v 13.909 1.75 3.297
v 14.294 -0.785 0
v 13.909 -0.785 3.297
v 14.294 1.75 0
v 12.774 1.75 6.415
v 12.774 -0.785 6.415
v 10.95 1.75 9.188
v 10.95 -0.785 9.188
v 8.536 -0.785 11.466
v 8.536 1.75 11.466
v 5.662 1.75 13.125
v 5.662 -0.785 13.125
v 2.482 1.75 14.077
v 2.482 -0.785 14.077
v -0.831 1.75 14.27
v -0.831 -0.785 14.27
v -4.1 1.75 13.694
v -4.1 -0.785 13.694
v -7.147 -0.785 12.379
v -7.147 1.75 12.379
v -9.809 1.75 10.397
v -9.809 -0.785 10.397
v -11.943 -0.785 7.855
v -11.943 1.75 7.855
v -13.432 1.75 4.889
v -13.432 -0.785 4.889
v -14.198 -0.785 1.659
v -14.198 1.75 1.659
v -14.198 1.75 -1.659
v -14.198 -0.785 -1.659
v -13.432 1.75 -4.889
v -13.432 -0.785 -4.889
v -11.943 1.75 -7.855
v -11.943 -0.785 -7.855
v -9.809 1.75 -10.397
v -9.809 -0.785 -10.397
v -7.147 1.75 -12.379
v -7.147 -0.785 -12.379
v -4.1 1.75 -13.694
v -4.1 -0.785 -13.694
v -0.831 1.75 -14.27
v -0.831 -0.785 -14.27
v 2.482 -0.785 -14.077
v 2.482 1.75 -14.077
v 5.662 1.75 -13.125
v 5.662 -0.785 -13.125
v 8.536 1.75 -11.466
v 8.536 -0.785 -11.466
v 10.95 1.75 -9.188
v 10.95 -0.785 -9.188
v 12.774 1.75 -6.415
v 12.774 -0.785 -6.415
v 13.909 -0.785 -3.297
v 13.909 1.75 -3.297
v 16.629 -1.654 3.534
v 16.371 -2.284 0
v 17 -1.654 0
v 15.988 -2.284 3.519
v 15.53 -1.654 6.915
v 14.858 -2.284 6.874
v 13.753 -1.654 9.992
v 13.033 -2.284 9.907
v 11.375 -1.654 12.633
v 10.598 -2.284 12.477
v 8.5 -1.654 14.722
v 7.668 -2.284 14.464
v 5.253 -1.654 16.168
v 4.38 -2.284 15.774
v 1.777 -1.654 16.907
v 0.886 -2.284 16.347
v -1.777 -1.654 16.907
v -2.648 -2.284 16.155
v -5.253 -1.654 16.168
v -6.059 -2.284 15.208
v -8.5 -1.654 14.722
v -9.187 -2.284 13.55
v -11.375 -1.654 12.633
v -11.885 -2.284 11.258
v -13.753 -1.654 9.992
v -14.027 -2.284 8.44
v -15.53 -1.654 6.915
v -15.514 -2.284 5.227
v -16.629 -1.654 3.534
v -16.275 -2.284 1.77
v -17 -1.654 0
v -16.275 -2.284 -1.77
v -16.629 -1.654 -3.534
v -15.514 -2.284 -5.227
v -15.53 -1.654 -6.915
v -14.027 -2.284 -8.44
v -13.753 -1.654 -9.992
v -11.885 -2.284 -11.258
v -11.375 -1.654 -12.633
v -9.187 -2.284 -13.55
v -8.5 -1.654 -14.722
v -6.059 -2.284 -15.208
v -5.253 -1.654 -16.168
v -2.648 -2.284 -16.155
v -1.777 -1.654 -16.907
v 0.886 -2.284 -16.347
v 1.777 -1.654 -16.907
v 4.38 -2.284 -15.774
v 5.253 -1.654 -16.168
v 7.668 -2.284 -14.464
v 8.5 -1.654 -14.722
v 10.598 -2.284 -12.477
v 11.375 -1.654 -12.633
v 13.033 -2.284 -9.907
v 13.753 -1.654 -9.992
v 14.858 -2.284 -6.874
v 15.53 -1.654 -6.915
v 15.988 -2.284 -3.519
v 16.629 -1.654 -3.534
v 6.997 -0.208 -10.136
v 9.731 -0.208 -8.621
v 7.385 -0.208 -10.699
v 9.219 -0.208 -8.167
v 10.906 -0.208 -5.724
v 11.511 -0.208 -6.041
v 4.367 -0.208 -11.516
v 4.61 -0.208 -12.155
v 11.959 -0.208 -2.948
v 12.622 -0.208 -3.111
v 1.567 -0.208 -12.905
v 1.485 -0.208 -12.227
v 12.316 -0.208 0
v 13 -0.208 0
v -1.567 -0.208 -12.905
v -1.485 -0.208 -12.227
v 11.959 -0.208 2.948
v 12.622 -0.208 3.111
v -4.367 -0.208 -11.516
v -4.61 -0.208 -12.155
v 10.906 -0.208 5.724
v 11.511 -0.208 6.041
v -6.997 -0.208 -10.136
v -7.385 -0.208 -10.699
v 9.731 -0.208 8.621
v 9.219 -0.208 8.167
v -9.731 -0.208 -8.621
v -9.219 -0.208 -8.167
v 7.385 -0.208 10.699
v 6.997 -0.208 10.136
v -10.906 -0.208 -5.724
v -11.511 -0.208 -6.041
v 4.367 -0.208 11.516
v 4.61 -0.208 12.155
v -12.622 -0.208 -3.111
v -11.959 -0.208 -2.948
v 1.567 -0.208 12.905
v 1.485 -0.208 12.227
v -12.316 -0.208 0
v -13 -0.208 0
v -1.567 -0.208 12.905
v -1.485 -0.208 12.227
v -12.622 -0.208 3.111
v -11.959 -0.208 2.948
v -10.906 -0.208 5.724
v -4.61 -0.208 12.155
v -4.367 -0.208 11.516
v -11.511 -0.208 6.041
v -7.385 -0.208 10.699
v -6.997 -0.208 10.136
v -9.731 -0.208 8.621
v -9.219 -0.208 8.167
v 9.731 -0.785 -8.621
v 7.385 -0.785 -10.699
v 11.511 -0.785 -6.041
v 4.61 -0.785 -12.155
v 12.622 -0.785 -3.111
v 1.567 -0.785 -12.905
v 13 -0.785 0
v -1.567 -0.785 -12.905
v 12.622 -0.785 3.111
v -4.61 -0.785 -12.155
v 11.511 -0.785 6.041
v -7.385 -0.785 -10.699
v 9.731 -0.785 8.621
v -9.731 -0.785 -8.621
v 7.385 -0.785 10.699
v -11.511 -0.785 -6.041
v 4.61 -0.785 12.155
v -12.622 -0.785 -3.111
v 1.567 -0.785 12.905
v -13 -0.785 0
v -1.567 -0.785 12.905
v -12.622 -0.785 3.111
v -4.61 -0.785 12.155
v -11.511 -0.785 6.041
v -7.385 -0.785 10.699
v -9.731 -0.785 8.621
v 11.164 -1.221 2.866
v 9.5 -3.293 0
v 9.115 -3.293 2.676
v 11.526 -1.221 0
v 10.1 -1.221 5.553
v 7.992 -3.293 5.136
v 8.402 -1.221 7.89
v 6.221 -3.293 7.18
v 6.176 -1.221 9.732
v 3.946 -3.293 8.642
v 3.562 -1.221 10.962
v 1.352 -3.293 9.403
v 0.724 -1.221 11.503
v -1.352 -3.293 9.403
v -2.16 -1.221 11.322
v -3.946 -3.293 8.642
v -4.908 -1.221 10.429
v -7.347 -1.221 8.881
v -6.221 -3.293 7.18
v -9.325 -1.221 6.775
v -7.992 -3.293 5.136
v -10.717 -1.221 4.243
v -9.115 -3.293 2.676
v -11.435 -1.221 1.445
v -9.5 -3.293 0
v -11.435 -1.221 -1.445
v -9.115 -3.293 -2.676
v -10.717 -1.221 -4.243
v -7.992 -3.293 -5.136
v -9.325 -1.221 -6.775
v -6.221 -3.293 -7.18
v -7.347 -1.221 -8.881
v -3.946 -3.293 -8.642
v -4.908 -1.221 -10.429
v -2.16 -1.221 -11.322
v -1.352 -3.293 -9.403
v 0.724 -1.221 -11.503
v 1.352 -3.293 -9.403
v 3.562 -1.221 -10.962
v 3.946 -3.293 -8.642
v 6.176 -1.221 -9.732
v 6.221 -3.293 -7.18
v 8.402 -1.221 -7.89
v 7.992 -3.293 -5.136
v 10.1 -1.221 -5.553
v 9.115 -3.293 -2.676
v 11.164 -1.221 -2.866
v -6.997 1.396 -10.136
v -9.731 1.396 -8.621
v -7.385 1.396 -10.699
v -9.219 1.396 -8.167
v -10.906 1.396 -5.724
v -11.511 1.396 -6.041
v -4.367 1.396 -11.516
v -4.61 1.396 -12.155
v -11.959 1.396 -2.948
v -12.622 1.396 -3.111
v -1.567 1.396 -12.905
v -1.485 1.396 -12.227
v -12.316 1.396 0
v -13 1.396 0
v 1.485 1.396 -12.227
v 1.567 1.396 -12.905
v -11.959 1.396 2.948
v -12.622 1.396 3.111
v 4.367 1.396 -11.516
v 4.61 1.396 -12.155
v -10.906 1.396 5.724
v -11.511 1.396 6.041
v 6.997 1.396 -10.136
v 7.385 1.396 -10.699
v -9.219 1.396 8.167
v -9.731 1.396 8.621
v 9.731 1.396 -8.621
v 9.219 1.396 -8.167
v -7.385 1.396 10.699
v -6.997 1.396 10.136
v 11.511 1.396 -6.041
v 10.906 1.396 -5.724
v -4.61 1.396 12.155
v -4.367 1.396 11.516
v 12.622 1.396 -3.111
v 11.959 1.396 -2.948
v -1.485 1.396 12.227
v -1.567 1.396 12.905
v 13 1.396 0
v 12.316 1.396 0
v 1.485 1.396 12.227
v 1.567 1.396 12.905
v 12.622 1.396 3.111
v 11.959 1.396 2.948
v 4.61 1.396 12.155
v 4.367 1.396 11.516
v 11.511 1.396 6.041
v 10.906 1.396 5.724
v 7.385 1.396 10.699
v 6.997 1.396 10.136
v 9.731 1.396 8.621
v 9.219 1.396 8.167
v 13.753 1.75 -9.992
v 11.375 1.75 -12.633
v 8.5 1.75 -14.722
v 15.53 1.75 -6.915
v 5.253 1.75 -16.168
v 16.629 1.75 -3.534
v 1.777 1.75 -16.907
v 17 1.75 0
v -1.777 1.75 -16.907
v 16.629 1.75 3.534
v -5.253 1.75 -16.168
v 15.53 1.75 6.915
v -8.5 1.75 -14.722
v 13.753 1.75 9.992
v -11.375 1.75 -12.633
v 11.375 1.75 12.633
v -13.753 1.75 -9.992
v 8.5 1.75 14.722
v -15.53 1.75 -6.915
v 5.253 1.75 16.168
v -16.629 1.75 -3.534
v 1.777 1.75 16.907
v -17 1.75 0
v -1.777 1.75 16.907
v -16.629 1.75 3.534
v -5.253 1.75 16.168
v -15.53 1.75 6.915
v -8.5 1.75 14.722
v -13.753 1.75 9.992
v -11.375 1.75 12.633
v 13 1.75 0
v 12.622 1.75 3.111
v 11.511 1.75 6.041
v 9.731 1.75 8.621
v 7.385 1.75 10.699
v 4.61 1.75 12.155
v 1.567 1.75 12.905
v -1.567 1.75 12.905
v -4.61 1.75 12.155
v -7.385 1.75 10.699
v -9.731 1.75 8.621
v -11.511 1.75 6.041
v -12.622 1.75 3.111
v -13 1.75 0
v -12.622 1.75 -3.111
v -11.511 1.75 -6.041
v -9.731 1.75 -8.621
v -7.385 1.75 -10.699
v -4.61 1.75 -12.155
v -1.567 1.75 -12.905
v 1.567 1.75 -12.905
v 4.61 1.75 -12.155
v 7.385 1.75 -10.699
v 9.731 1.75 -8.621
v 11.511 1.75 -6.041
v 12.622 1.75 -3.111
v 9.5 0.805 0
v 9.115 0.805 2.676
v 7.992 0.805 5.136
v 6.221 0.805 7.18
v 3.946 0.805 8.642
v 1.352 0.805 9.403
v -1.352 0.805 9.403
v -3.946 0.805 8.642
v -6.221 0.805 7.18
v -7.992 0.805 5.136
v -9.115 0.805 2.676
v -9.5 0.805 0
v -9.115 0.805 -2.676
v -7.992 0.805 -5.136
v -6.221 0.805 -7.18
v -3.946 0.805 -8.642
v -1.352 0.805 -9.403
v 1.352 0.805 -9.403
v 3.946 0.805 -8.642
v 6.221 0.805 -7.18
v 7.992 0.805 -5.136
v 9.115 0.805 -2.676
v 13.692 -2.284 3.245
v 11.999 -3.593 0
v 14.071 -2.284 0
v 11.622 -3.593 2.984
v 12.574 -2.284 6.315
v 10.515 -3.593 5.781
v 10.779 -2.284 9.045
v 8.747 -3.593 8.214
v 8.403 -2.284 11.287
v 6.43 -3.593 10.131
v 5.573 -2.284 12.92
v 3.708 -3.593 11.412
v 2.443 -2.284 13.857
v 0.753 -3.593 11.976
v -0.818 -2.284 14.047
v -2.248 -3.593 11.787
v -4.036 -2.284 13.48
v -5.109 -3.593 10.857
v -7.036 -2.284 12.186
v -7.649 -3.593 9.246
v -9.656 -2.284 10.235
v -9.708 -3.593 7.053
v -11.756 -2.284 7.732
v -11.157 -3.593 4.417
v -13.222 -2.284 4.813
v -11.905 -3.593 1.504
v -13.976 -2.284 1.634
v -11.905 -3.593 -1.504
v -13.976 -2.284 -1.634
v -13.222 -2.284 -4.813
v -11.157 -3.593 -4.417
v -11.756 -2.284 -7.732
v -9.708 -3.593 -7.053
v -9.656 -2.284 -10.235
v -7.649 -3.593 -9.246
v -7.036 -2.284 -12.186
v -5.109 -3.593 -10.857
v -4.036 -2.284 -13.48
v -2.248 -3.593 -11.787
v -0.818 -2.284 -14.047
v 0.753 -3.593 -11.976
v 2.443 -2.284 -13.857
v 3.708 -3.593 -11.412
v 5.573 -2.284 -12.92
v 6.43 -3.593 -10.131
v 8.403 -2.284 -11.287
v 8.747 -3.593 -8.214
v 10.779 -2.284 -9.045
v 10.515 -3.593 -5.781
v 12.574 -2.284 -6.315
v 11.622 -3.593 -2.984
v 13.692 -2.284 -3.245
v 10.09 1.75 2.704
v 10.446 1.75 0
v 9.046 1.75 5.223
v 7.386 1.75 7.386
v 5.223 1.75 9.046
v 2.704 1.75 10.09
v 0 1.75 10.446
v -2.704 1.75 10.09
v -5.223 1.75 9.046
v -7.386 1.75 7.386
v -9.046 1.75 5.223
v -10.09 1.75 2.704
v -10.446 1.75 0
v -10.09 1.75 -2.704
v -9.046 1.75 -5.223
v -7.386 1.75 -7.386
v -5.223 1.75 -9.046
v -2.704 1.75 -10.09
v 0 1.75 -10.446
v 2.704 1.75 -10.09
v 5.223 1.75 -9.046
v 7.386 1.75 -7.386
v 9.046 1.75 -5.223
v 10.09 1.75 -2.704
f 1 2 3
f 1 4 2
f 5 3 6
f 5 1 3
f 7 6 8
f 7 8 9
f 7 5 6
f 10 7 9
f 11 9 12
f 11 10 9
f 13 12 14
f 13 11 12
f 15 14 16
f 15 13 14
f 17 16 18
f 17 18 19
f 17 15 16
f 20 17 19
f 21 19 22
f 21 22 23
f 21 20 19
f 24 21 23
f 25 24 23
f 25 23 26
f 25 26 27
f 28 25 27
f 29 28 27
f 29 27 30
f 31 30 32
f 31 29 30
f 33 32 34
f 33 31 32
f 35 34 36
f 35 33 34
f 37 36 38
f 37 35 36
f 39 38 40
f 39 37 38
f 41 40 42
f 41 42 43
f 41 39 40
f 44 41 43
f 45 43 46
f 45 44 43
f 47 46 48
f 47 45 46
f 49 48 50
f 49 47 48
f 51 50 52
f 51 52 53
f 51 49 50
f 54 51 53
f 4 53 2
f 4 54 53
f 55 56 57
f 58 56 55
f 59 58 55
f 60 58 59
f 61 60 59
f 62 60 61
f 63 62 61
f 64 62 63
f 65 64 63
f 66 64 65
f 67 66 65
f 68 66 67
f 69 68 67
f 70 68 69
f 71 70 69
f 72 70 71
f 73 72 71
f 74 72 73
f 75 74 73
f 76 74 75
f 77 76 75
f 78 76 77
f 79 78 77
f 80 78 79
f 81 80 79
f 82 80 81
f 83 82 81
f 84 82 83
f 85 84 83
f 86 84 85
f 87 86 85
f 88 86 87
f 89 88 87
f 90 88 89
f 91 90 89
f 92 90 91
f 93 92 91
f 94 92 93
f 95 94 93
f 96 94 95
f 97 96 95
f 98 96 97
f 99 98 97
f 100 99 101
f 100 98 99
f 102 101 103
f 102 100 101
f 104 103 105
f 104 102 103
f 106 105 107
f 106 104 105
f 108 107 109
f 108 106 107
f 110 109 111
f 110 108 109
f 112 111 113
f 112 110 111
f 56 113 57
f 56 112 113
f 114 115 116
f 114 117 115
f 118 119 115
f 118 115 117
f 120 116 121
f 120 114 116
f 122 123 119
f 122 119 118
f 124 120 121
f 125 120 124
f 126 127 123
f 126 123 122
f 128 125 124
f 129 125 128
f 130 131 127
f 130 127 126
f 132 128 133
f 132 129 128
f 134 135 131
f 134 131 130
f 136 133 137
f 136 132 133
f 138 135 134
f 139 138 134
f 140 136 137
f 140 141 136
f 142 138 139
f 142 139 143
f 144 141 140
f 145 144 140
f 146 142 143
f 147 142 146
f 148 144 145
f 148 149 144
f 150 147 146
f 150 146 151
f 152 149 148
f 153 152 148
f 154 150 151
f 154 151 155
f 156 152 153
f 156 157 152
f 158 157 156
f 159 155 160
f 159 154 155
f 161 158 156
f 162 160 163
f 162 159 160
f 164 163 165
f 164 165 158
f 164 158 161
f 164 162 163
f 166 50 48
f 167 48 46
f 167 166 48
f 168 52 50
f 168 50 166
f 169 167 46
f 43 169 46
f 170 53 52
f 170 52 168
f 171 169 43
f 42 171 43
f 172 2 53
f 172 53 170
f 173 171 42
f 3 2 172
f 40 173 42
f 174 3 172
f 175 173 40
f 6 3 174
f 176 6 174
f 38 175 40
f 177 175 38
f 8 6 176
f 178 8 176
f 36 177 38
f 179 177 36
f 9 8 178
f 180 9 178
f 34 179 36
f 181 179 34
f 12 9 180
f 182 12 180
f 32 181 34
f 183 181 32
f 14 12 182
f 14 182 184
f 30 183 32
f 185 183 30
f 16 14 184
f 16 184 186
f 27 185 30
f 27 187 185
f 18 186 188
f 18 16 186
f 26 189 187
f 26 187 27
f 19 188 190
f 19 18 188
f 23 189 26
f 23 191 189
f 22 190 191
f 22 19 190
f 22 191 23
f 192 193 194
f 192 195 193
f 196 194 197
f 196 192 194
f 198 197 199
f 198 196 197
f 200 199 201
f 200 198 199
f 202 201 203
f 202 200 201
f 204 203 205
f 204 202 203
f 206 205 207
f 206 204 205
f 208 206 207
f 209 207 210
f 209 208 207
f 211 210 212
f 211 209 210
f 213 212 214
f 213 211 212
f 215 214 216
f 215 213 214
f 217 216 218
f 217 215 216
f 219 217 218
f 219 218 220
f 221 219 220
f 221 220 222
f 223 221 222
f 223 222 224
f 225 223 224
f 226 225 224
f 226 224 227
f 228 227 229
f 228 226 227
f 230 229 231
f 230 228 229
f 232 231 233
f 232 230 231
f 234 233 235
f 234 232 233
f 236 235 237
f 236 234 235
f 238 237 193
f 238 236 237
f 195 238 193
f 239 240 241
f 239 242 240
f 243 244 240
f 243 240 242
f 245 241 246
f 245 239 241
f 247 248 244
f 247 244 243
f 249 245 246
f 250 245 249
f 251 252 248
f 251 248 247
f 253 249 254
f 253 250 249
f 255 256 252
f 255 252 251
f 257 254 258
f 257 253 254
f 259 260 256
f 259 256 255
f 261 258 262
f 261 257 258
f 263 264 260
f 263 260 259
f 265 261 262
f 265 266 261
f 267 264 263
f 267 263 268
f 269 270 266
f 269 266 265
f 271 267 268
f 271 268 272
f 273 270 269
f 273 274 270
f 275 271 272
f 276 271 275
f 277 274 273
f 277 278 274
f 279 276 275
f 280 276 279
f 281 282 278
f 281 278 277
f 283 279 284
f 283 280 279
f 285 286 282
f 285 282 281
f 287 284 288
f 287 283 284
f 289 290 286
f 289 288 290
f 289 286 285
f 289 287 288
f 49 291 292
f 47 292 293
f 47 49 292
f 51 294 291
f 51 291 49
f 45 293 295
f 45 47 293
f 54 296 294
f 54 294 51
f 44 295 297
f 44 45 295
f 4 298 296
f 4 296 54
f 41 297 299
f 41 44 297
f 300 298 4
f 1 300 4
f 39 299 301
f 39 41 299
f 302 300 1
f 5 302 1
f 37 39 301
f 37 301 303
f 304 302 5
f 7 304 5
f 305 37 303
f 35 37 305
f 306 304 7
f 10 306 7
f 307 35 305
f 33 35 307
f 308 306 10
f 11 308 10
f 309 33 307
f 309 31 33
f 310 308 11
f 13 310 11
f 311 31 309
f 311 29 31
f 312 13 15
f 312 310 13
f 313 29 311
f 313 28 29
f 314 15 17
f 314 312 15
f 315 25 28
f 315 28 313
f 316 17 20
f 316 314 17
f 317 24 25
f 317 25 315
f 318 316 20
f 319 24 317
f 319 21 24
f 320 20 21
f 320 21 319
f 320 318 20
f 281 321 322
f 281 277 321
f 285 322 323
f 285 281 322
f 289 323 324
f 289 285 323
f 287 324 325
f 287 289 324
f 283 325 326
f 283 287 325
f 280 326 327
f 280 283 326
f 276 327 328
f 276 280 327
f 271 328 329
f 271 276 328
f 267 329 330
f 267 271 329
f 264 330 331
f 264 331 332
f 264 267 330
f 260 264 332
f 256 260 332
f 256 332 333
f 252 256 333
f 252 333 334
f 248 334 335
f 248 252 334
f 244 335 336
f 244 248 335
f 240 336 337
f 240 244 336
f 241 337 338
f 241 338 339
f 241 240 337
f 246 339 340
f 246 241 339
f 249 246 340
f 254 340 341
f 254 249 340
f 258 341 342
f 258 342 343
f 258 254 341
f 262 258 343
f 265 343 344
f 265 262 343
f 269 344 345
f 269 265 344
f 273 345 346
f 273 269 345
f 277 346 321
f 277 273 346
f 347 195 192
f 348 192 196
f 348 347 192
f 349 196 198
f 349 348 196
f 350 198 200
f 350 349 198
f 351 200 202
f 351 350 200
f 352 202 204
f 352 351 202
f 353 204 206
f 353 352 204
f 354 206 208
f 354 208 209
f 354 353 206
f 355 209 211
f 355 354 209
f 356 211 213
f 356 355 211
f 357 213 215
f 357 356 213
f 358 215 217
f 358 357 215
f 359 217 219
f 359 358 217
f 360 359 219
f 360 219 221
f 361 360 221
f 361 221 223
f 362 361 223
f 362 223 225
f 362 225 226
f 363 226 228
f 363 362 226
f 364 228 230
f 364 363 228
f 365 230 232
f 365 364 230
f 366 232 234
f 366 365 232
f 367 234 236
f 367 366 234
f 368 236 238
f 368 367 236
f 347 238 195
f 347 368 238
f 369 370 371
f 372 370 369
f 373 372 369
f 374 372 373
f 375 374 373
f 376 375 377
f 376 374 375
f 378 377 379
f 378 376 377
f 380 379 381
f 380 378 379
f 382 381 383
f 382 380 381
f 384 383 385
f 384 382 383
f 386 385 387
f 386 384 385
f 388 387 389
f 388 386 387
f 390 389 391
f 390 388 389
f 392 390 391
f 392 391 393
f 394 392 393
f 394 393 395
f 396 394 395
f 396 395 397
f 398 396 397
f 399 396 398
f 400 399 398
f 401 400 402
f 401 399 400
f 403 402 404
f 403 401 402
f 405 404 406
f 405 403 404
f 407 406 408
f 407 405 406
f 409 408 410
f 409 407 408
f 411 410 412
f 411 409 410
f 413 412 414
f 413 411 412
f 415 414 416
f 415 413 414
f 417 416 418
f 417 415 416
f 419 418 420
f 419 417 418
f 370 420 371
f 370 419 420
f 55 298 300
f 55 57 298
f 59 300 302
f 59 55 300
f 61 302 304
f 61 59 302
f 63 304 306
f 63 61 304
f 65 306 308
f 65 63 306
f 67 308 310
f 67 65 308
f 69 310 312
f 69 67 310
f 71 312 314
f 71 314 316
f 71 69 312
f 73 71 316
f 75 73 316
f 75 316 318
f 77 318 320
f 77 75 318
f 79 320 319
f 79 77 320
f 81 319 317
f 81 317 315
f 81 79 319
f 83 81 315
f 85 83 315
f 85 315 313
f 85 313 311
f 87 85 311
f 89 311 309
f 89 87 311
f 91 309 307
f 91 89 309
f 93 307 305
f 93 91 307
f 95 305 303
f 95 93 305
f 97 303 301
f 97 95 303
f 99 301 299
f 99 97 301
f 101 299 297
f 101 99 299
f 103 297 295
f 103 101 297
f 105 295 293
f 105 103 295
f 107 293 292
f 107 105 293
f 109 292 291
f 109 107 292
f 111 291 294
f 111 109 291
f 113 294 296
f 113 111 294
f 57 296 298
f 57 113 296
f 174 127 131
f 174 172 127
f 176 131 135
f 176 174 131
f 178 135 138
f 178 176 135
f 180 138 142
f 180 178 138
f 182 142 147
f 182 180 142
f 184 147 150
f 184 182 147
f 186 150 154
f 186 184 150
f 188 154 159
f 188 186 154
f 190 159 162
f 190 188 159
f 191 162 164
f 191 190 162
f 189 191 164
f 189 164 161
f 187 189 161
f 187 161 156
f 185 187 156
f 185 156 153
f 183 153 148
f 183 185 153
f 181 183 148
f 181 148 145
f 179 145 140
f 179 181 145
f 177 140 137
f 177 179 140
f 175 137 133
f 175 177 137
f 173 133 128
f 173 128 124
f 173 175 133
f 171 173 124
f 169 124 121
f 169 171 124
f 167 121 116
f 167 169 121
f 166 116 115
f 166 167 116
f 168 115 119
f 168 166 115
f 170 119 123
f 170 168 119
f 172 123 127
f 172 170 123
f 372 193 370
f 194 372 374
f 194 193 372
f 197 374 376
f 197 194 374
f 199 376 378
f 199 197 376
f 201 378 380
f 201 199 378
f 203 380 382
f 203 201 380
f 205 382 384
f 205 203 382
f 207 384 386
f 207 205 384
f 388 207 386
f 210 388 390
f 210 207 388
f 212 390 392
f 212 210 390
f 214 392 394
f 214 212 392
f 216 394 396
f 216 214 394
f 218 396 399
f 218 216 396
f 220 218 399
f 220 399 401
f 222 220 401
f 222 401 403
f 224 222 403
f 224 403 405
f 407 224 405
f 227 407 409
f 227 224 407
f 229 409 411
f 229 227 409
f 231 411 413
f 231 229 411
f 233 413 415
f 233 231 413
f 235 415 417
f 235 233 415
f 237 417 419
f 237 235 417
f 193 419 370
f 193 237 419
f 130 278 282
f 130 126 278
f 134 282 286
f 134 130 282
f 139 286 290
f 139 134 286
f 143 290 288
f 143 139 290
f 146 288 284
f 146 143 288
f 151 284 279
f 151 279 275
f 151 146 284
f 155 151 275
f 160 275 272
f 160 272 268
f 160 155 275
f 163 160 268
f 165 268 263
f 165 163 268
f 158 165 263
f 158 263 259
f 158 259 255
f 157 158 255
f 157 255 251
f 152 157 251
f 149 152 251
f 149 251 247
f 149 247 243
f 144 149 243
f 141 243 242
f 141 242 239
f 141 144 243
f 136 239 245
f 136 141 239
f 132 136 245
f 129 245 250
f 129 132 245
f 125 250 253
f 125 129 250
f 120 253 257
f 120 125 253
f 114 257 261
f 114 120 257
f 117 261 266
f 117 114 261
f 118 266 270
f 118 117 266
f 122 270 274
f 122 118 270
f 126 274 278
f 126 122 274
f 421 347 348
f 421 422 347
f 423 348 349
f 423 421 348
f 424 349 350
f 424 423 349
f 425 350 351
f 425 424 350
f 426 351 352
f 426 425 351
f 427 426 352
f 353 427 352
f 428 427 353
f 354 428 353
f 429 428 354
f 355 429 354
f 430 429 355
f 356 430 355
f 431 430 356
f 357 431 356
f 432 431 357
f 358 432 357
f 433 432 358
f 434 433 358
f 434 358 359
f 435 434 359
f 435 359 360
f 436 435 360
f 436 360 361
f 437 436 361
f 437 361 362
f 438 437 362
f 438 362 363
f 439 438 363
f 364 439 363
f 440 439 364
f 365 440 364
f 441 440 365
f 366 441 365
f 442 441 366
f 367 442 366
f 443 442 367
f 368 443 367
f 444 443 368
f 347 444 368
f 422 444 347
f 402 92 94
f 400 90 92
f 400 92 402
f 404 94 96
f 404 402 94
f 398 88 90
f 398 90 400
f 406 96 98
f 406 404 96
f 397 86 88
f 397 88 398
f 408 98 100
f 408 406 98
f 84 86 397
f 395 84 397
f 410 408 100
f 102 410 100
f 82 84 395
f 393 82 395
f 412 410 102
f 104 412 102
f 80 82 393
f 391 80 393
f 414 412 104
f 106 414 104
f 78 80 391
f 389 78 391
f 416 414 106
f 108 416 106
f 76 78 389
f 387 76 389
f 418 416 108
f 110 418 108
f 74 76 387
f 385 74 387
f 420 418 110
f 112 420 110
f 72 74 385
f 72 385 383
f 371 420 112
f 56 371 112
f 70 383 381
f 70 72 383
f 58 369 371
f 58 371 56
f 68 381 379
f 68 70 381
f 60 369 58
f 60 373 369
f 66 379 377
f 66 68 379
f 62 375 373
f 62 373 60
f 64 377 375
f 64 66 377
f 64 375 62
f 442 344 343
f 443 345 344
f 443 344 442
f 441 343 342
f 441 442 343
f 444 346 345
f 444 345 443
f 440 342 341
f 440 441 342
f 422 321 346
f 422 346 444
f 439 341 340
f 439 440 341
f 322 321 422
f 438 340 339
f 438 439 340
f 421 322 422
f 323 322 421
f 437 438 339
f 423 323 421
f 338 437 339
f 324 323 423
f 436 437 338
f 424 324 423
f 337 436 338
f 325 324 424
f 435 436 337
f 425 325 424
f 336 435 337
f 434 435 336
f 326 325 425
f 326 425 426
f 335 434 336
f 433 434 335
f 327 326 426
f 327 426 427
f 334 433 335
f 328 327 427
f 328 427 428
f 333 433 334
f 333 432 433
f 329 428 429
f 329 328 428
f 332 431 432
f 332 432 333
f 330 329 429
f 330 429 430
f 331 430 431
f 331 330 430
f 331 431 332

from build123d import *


with BuildPart() as part:
    # Эскиз1 → Повернуть1 (revolve)
    with BuildSketch(Plane.XY):
        Polygon((11.525952606, -1.221276852), (9.5, 0.804675754), (10.445620692, 1.750296446), (13, 1.750296446), (13, 1.395888621), (12.316457293, 1.395888621), (12.316457293, -0.208300549), (13, -0.208300549), (13, -0.785082607), (14.294407296, -0.785082607), (14.294407296, 1.750296446), (17, 1.750296446), (17, -1.654414722), (16.3705936, -2.283821122), (14.071003585, -2.283821122), (11.999272747, -3.593083063), (9.5, -3.293199519), align=None)
    revolve(axis=Axis((0, 17.208784833, 0), (0, -1, 0)))


solid = part.part
